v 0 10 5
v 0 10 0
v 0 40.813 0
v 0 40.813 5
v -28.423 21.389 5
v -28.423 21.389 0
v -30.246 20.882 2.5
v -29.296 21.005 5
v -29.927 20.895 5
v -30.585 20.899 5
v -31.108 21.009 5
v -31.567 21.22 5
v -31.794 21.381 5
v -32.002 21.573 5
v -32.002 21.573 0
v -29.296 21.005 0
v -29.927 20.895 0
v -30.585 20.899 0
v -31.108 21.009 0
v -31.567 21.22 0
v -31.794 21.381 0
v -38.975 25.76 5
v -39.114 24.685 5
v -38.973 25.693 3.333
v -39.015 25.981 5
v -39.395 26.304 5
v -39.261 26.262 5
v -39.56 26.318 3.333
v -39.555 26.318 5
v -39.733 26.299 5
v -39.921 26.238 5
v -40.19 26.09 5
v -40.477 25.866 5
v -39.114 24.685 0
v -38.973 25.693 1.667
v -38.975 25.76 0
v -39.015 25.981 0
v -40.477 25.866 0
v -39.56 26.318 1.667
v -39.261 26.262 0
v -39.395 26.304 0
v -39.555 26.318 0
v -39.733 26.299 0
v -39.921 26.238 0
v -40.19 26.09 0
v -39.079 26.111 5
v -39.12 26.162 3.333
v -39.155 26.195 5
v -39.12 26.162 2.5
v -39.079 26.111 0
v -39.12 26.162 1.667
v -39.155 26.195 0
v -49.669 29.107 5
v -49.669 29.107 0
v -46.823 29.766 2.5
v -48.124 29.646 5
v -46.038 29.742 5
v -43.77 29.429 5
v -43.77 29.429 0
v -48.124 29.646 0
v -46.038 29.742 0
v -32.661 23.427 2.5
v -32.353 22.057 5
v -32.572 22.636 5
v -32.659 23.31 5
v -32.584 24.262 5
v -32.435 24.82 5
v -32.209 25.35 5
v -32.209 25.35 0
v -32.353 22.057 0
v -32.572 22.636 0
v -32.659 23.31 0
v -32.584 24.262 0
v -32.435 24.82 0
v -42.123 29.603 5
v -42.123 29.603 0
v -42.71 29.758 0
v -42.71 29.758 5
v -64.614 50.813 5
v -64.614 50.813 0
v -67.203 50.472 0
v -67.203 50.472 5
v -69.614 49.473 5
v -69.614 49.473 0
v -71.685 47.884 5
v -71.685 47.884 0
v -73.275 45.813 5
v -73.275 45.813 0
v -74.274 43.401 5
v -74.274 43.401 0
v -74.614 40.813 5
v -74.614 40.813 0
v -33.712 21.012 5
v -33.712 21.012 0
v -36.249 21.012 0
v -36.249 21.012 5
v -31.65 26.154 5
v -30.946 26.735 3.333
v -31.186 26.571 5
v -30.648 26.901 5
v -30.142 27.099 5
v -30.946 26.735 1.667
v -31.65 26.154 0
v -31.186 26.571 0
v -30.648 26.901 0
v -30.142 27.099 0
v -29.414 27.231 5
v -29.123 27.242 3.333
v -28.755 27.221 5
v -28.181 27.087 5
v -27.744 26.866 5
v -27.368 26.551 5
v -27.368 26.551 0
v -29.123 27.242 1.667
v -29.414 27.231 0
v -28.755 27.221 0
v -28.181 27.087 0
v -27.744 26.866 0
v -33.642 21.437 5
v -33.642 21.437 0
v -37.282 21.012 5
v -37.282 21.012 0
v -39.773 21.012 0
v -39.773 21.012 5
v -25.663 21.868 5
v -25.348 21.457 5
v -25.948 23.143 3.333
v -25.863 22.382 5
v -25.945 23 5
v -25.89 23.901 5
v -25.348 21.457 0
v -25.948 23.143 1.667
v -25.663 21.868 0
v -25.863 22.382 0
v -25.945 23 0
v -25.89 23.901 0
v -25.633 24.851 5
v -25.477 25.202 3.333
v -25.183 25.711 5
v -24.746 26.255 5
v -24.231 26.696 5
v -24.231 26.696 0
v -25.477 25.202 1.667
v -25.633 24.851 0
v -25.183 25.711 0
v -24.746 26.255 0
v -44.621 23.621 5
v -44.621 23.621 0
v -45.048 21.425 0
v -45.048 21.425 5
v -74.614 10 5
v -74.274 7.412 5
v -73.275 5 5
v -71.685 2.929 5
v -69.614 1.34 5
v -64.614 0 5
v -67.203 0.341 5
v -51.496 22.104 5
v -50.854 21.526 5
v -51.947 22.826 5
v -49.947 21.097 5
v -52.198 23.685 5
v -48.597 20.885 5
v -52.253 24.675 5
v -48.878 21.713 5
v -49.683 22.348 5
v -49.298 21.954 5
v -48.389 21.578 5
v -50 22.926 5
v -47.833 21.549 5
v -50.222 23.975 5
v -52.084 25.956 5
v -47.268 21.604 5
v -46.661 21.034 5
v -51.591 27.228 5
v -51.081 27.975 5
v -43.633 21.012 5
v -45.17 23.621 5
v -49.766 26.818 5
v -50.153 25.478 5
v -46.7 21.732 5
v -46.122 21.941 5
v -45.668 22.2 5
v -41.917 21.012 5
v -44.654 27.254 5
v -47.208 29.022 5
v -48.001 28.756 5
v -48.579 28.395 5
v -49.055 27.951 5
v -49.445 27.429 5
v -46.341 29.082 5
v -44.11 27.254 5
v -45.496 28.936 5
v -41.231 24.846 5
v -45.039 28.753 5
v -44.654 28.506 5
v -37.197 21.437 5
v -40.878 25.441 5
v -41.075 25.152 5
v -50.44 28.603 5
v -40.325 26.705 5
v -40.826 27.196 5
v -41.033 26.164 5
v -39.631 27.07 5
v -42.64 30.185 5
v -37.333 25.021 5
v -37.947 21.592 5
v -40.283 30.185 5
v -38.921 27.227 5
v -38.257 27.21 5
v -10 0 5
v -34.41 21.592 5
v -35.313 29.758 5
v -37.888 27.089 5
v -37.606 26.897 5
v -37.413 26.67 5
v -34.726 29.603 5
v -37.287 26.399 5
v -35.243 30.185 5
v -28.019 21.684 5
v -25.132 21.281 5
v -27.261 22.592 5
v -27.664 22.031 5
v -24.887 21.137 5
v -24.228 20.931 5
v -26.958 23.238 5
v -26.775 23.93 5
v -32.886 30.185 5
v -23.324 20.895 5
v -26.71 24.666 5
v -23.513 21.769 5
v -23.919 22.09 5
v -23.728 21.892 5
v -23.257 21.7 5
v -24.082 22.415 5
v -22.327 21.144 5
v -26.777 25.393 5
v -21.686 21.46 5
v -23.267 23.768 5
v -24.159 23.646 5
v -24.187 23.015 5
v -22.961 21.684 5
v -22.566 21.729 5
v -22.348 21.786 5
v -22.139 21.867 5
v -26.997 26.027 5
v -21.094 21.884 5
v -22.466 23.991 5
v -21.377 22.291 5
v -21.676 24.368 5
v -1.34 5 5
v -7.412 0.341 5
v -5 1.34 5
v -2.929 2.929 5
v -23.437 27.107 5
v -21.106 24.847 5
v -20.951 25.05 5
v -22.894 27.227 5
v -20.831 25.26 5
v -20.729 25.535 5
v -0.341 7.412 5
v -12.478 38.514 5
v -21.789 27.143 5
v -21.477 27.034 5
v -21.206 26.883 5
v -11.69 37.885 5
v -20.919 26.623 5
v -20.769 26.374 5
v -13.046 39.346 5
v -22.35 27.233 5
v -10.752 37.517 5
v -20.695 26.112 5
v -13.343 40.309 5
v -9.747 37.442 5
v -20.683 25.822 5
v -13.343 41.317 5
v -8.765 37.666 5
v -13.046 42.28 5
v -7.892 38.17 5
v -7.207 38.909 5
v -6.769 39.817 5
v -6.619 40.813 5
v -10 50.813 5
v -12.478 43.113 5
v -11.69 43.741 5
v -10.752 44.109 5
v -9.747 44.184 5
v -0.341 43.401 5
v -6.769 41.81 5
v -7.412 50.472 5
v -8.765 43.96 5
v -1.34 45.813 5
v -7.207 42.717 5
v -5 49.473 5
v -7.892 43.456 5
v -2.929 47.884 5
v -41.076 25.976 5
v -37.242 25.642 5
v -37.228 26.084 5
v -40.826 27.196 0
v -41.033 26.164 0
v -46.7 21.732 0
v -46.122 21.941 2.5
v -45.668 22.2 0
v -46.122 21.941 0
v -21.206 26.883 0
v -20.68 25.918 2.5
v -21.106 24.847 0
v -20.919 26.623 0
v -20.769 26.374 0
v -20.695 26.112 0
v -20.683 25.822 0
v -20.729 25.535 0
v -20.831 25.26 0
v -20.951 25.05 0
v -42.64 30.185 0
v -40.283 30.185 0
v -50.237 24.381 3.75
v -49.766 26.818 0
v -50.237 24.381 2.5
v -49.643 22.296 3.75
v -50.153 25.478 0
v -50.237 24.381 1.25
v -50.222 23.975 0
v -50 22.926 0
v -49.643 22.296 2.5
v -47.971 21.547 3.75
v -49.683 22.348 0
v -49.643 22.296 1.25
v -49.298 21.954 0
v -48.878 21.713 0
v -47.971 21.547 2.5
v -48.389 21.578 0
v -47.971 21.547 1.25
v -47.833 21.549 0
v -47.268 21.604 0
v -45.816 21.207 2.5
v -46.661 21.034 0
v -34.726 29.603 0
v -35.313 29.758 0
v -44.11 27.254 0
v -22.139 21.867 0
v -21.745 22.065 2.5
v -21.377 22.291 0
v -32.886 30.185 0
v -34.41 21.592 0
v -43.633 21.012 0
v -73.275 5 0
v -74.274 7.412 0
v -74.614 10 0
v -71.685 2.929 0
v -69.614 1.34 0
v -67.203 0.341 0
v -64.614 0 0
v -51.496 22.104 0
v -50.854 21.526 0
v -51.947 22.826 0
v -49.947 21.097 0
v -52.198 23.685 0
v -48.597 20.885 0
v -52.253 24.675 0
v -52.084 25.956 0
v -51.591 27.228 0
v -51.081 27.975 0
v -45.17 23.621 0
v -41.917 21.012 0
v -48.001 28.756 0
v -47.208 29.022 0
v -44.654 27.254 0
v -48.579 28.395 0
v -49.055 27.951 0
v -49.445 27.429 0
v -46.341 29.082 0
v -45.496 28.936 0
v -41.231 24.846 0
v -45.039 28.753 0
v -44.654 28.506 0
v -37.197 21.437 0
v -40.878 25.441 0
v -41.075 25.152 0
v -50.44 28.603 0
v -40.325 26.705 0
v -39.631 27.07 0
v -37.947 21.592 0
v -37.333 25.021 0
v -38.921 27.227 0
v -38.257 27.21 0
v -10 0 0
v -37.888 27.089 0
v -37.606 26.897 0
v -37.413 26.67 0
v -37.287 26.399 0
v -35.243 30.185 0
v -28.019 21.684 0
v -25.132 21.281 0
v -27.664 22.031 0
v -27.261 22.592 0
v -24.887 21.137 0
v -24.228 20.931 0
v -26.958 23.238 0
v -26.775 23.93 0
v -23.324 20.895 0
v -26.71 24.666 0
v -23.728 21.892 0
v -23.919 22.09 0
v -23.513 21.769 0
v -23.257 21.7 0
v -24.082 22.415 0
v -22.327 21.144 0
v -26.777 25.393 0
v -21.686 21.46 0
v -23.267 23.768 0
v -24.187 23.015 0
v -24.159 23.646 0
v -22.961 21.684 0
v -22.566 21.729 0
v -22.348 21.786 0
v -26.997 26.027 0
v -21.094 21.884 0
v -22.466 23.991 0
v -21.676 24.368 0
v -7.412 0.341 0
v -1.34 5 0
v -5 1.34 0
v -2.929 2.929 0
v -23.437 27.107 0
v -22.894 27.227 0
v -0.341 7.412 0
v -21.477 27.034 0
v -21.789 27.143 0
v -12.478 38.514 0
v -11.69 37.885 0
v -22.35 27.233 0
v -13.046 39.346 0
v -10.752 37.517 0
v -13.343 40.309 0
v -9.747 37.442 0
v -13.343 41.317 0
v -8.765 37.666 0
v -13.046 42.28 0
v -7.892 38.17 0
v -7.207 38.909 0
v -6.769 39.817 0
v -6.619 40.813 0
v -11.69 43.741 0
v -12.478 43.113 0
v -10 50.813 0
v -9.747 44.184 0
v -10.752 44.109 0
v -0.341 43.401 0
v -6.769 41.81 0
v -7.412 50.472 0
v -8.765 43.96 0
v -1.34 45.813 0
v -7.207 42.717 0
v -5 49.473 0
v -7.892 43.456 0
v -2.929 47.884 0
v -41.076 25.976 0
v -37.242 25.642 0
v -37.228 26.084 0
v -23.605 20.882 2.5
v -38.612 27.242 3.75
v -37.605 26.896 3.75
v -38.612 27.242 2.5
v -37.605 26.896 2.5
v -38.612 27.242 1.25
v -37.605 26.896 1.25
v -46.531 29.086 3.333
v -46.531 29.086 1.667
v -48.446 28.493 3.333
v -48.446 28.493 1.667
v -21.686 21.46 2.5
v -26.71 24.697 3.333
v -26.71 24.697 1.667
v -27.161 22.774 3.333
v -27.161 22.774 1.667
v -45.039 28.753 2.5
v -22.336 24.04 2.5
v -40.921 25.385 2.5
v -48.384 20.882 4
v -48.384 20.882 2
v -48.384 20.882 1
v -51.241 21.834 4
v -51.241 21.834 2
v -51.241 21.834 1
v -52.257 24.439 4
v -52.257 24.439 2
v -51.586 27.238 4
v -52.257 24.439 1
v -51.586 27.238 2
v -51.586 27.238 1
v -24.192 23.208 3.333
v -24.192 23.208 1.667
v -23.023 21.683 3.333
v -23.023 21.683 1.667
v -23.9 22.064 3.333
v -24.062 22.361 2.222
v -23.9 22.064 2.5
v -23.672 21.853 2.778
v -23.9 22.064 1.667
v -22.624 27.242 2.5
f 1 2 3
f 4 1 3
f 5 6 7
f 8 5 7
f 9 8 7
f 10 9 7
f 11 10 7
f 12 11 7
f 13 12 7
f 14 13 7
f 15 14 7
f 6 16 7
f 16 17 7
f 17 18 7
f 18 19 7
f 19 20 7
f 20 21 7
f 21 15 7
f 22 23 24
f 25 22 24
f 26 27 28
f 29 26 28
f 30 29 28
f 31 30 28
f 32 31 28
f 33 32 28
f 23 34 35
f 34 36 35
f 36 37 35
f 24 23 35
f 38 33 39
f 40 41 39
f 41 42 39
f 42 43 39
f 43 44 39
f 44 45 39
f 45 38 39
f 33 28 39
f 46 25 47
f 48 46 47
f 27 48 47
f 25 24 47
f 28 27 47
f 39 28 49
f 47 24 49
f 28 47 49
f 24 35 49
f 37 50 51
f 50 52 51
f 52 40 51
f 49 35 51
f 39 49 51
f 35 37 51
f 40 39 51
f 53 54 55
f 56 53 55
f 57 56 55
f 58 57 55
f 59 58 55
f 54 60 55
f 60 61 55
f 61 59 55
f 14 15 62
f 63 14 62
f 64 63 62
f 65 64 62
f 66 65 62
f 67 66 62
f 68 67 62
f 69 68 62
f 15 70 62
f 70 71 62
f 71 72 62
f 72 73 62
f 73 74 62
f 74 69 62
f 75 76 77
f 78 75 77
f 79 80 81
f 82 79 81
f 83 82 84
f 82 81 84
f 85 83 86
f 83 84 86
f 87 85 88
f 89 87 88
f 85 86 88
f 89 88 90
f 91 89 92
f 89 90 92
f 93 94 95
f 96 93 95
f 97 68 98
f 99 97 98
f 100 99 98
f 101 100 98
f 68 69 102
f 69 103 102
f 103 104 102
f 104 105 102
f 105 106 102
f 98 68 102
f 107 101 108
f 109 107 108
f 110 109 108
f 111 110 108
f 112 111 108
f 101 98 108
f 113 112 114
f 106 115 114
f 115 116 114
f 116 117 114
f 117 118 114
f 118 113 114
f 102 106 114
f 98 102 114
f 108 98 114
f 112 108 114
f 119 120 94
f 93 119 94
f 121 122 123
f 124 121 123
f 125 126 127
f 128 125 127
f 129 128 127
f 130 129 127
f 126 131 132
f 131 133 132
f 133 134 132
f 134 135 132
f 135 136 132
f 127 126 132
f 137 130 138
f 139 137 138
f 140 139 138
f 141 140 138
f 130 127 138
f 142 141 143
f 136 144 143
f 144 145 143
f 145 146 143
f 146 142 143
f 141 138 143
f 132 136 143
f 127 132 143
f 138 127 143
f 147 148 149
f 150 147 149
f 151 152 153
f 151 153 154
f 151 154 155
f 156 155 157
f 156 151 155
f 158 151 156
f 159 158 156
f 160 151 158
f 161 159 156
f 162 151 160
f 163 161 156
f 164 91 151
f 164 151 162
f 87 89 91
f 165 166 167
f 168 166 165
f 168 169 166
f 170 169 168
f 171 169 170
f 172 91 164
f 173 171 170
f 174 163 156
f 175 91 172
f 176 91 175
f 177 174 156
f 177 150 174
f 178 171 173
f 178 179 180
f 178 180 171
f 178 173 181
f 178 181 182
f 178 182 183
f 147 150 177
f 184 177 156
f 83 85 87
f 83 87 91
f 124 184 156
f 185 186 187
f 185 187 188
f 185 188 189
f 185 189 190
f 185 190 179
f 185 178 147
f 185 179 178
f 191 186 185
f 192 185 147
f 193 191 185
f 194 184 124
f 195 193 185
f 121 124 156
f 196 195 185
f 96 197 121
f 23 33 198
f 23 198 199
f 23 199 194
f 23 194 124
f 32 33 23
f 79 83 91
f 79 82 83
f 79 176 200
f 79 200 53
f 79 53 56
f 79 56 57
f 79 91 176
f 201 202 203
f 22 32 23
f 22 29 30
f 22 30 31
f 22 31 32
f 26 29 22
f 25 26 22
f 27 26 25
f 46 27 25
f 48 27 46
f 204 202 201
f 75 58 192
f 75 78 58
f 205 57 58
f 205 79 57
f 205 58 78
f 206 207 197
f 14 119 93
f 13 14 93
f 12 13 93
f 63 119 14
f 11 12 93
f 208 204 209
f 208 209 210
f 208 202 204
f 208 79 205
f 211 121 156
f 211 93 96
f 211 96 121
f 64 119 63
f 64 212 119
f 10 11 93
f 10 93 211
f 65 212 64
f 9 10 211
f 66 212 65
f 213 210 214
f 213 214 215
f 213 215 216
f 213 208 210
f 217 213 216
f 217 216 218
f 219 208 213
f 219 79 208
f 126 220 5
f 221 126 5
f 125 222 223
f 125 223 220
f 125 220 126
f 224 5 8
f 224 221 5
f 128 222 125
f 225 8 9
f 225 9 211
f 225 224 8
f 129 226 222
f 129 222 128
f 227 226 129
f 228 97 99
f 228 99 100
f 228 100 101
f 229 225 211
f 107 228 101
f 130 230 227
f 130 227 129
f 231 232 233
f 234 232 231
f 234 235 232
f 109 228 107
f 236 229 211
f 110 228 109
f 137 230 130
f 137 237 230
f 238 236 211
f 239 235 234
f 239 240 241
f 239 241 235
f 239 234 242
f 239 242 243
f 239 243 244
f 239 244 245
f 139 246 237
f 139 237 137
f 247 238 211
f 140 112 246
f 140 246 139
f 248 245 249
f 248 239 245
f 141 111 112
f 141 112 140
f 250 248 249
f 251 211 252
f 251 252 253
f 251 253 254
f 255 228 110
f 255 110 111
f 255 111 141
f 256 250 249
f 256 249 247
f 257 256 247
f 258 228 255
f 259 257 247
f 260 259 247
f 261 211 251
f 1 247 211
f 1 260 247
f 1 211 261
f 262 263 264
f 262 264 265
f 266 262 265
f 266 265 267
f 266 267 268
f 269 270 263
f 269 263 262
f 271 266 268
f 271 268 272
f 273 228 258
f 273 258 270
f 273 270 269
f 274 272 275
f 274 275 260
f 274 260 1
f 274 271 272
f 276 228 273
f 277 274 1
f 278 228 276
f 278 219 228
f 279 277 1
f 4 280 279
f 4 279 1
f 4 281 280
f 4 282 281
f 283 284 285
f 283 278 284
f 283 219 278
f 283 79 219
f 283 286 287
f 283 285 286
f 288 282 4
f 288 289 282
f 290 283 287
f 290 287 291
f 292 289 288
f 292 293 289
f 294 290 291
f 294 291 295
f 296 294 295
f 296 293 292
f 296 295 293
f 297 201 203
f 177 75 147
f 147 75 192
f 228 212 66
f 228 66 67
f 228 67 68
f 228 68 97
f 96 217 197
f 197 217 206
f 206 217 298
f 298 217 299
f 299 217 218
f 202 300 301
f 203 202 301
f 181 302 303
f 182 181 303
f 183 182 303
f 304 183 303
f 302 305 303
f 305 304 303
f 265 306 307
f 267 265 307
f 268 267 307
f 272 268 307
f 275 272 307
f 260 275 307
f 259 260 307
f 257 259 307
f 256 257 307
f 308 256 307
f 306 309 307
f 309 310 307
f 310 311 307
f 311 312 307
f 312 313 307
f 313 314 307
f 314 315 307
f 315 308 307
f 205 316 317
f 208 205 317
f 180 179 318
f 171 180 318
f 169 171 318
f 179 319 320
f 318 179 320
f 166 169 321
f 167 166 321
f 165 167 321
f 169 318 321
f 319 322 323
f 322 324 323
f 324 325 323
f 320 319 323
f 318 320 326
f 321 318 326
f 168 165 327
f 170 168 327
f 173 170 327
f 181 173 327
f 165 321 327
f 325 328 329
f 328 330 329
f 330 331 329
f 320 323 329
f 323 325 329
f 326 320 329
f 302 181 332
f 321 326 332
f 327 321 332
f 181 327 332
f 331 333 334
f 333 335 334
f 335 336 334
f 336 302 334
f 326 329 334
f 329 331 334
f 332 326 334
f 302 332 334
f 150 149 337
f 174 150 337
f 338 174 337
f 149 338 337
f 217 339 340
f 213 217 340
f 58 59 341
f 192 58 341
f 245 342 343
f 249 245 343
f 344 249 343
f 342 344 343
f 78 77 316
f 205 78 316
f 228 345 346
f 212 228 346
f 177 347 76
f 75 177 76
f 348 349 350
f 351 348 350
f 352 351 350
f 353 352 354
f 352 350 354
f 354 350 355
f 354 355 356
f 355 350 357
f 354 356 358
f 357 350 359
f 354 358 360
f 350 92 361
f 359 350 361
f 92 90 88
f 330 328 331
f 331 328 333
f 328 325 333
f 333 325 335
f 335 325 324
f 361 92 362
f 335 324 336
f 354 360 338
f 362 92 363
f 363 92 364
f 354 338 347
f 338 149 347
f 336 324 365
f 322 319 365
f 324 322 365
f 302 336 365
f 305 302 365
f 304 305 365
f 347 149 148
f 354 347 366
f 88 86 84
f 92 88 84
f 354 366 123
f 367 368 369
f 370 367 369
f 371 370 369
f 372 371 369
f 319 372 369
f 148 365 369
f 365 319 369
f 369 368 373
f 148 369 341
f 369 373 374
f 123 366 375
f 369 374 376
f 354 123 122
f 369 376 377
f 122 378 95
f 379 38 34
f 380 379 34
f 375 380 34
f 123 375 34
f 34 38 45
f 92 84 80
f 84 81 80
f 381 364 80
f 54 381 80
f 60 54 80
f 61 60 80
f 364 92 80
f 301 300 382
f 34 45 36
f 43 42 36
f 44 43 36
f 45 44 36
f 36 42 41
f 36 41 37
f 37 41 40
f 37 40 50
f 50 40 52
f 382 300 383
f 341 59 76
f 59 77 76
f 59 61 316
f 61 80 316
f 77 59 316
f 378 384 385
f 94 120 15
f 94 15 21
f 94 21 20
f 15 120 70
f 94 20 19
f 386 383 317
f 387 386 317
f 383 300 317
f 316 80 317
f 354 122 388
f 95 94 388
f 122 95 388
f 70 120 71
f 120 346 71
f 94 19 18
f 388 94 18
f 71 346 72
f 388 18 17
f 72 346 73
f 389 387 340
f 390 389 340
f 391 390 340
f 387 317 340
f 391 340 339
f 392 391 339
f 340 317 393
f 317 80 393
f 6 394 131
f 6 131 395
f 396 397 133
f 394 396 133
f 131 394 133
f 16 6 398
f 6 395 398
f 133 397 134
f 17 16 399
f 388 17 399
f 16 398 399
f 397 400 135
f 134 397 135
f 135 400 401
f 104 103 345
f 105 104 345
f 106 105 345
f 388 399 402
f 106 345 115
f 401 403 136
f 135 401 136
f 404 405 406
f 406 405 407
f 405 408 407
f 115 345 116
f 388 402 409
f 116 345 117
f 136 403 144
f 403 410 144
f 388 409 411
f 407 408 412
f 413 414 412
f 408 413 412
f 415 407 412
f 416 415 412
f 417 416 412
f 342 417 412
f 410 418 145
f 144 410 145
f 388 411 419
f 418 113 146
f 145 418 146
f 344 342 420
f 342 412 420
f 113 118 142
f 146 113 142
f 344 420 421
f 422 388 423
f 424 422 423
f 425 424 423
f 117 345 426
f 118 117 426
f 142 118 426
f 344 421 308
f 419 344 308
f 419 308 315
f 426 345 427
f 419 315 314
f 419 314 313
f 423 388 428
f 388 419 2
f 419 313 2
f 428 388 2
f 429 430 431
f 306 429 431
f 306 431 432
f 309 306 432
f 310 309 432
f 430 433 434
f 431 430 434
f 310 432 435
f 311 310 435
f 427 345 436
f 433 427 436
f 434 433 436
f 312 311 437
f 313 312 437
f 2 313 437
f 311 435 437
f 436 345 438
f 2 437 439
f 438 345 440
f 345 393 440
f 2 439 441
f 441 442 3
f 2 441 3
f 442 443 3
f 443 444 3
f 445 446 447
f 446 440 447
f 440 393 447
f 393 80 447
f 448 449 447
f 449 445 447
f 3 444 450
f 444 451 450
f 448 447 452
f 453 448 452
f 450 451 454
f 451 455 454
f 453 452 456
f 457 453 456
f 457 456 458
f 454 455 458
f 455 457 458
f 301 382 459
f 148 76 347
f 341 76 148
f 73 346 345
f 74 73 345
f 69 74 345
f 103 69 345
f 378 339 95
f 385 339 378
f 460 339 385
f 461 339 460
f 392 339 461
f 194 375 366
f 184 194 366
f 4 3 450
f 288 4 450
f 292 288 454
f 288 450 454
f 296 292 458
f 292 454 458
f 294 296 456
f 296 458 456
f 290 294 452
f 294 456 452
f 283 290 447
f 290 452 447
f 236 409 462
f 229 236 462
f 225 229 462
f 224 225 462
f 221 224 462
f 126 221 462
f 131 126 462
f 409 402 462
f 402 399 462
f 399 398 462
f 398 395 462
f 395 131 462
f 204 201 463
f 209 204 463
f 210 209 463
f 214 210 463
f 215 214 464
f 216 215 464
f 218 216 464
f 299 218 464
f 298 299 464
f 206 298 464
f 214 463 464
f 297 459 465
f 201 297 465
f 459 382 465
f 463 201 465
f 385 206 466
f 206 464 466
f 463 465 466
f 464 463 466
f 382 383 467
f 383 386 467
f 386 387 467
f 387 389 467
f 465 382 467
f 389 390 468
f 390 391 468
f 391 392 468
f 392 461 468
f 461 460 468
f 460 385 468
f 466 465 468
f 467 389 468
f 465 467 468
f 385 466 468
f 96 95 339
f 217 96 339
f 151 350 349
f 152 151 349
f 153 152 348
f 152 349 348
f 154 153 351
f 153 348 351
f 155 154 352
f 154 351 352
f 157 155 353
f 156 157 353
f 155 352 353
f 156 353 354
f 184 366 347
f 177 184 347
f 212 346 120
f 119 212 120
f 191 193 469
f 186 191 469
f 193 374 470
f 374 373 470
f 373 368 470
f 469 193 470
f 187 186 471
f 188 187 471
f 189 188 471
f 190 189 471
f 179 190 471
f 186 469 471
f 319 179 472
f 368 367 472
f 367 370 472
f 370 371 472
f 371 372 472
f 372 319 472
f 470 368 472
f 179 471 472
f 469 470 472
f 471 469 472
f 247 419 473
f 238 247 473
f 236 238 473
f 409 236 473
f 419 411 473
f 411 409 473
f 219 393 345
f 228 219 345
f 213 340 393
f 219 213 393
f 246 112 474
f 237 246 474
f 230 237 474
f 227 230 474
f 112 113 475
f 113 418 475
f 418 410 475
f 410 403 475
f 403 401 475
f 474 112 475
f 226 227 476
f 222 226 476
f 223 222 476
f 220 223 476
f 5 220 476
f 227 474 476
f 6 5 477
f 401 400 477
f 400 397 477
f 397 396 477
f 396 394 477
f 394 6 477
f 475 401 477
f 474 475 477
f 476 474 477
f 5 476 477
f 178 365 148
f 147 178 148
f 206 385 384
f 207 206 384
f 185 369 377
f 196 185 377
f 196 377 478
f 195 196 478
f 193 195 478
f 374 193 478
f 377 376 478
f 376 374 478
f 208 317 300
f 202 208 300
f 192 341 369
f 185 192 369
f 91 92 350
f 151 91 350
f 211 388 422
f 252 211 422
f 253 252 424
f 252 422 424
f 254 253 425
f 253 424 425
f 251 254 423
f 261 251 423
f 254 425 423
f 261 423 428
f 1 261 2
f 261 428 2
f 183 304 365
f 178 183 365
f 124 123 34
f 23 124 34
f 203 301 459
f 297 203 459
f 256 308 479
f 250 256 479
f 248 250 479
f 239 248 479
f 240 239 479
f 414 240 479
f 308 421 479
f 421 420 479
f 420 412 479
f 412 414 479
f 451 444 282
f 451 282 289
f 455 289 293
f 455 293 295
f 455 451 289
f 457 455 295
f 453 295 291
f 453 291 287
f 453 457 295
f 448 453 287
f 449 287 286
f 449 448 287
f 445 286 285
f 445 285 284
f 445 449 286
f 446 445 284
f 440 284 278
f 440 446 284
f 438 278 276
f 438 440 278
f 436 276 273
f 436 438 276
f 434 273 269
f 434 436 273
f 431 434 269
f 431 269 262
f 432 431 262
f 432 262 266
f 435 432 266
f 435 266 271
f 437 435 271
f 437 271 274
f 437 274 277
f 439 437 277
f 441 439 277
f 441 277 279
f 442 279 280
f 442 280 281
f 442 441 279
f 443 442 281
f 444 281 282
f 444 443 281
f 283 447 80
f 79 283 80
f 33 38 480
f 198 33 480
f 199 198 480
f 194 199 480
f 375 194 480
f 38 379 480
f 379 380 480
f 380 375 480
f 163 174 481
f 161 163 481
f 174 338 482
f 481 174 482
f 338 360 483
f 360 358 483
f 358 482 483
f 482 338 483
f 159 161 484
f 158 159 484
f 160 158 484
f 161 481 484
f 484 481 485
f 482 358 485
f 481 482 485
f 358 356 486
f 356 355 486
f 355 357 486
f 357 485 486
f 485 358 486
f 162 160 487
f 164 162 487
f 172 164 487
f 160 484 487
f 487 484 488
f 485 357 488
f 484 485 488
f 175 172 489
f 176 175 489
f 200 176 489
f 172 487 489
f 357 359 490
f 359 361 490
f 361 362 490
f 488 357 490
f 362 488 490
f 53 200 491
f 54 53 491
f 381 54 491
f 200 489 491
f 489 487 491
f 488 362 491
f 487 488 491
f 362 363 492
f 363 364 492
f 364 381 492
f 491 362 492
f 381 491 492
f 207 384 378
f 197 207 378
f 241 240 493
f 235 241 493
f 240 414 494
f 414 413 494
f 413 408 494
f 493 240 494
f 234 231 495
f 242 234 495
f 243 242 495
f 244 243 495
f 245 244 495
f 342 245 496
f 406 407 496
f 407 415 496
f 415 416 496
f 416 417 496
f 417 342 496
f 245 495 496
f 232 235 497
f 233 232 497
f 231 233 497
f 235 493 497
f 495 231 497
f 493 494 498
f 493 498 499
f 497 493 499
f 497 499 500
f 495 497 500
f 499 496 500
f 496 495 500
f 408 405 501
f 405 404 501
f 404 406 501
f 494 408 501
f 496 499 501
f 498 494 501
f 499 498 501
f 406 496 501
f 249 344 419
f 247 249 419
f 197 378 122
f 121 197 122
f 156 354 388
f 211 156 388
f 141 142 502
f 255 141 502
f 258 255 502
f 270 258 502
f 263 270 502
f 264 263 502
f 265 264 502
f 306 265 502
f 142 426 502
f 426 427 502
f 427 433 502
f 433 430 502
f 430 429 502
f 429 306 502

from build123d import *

# Parameters (mm, degrees)
F0_R     = 3.3807298635
F1_DEPTH = 5


with BuildPart() as f1:
    # F0 (on Top) → F1 (new body)
    with BuildSketch(Plane.XY):
        with BuildLine():
            Line((-64.6143609347, 0), (-10, 0))
            ThreePointArc((-10, 0), (-2.9289321881, 2.9289321881), (0, 10))
            Line((0, 10), (0, 40.8130657572))
            ThreePointArc((0, 40.8130657572), (-2.9289321881, 47.8841335691), (-10, 50.8130657572))
            Line((-10, 50.8130657572), (-64.6143609347, 50.8130657572))
            ThreePointArc((-64.6143609347, 50.8130657572), (-71.6854287466, 47.8841335691), (-74.6143609347, 40.8130657572))
            Line((-74.6143609347, 40.8130657572), (-74.6143609347, 10))
            ThreePointArc((-74.6143609347, 10), (-71.6854287466, 2.9289321881), (-64.6143609347, 0))
        make_face()
        with BuildLine():
            add(Edge.make_bspline(
                [(-46.661470066, 21.0336615097), (-47.5455431911, 20.8818405408), (-48.3841733051, 20.8818405408)],
                knots=[0, 0, 0, 1, 1, 1], degree=2))
            add(Edge.make_bspline(
                [(-48.3841733051, 20.8818405408), (-50.2246152549, 20.8818405408), (-51.2408862305, 21.8340781826)],
                knots=[0, 0, 0, 1, 1, 1], degree=2))
            add(Edge.make_bspline(
                [(-51.2408862305, 21.8340781826), (-52.2571572061, 22.7863158244), (-52.2571572061, 24.4387889555)],
                knots=[0, 0, 0, 1, 1, 1], degree=2))
            add(Edge.make_bspline(
                [(-52.2571572061, 24.4387889555), (-52.2571572061, 26.0272287528), (-51.5858399966, 27.2376653213)],
                knots=[0, 0, 0, 1, 1, 1], degree=2))
            add(Edge.make_bspline(
                [(-51.5858399966, 27.2376653213), (-50.9145227871, 28.4481018898), (-49.6689711646, 29.1070255508)],
                knots=[0, 0, 0, 1, 1, 1], degree=2))
            add(Edge.make_bspline(
                [(-49.6689711646, 29.1070255508), (-48.423419542, 29.7659492119), (-46.8225861963, 29.7659492119)],
                knots=[0, 0, 0, 1, 1, 1], degree=2))
            add(Edge.make_bspline(
                [(-46.8225861963, 29.7659492119), (-45.3642786581, 29.7659492119), (-43.7696420866, 29.4292578114)],
                knots=[0, 0, 0, 1, 1, 1], degree=2))
            Line((-43.7696420866, 29.4292578114), (-44.1104646699, 27.2541900526))
            Line((-44.1104646699, 27.2541900526), (-44.6537152117, 27.2541900526))
            Line((-44.6537152117, 27.2541900526), (-44.6537152117, 28.5059384494))
            add(Edge.make_bspline(
                [(-44.6537152117, 28.5059384494), (-45.0028001606, 28.7847932903), (-45.4964765086, 28.9355814635)],
                knots=[0, 0, 0, 1, 1, 1], degree=2))
            add(Edge.make_bspline(
                [(-45.4964765086, 28.9355814635), (-45.9901528565, 29.0863696367), (-46.5313378069, 29.0863696367)],
                knots=[0, 0, 0, 1, 1, 1], degree=2))
            add(Edge.make_bspline(
                [(-46.5313378069, 29.0863696367), (-47.5971829765, 29.0863696367), (-48.4461410476, 28.4925121052)],
                knots=[0, 0, 0, 1, 1, 1], degree=2))
            add(Edge.make_bspline(
                [(-48.4461410476, 28.4925121052), (-49.2950991187, 27.8986545737), (-49.766053961, 26.8183502643)],
                knots=[0, 0, 0, 1, 1, 1], degree=2))
            add(Edge.make_bspline(
                [(-49.766053961, 26.8183502643), (-50.2370088034, 25.7380459548), (-50.2370088034, 24.3809523959)],
                knots=[0, 0, 0, 1, 1, 1], degree=2))
            add(Edge.make_bspline(
                [(-50.2370088034, 24.3809523959), (-50.2370088034, 23.0445147511), (-49.6431512719, 22.2957378636)],
                knots=[0, 0, 0, 1, 1, 1], degree=2))
            add(Edge.make_bspline(
                [(-49.6431512719, 22.2957378636), (-49.0492937404, 21.5469609761), (-47.9710550224, 21.5469609761)],
                knots=[0, 0, 0, 1, 1, 1], degree=2))
            add(Edge.make_bspline(
                [(-47.9710550224, 21.5469609761), (-47.3389840497, 21.5469609761), (-46.6996835071, 21.7318314076)],
                knots=[0, 0, 0, 1, 1, 1], degree=2))
            add(Edge.make_bspline(
                [(-46.6996835071, 21.7318314076), (-46.0603829645, 21.9167018392), (-45.6679205959, 22.1996878629)],
                knots=[0, 0, 0, 1, 1, 1], degree=2))
            Line((-45.6679205959, 22.1996878629), (-45.1701130652, 23.6208147556))
            Line((-45.1701130652, 23.6208147556), (-44.6206657491, 23.6208147556))
            Line((-44.6206657491, 23.6208147556), (-45.0482431718, 21.4250910827))
            add(Edge.make_bspline(
                [(-45.0482431718, 21.4250910827), (-45.7773969408, 21.1854824787), (-46.661470066, 21.0336615097)],
                knots=[0, 0, 0, 1, 1, 1], degree=2))
        make_face(mode=Mode.SUBTRACT)
        with BuildLine():
            add(Edge.make_bspline(
                [(-28.4233306773, 21.3889432329), (-29.2340753072, 20.8818405408), (-30.2462151, 20.8818405408)],
                knots=[0, 0, 0, 1, 1, 1], degree=2))
            add(Edge.make_bspline(
                [(-30.2462151, 20.8818405408), (-31.3430441408, 20.8818405408), (-32.0019678018, 21.5727808688)],
                knots=[0, 0, 0, 1, 1, 1], degree=2))
            add(Edge.make_bspline(
                [(-32.0019678018, 21.5727808688), (-32.6608914628, 22.2637211967), (-32.6608914628, 23.4266491627)],
                knots=[0, 0, 0, 1, 1, 1], degree=2))
            add(Edge.make_bspline(
                [(-32.6608914628, 23.4266491627), (-32.6608914628, 24.4718384181), (-32.2085269432, 25.349714769)],
                knots=[0, 0, 0, 1, 1, 1], degree=2))
            add(Edge.make_bspline(
                [(-32.2085269432, 25.349714769), (-31.7561624235, 26.2275911199), (-30.9464505893, 26.734693812)],
                knots=[0, 0, 0, 1, 1, 1], degree=2))
            add(Edge.make_bspline(
                [(-30.9464505893, 26.734693812), (-30.1367387551, 27.2417965041), (-29.1225333709, 27.2417965041)],
                knots=[0, 0, 0, 1, 1, 1], degree=2))
            add(Edge.make_bspline(
                [(-29.1225333709, 27.2417965041), (-28.0257043301, 27.2417965041), (-27.3678134648, 26.5508561762)],
                knots=[0, 0, 0, 1, 1, 1], degree=2))
            add(Edge.make_bspline(
                [(-27.3678134648, 26.5508561762), (-26.7099225995, 25.8599158482), (-26.7099225995, 24.6969878822)],
                knots=[0, 0, 0, 1, 1, 1], degree=2))
            add(Edge.make_bspline(
                [(-26.7099225995, 24.6969878822), (-26.7099225995, 23.6517986268), (-27.1612543234, 22.7739222759)],
                knots=[0, 0, 0, 1, 1, 1], degree=2))
            add(Edge.make_bspline(
                [(-27.1612543234, 22.7739222759), (-27.6125860473, 21.896045925), (-28.4233306773, 21.3889432329)],
                knots=[0, 0, 0, 1, 1, 1], degree=2))
        make_face(mode=Mode.SUBTRACT)
        with BuildLine():
            add(Edge.make_bspline(
                [(-21.2061542772, 26.8834163938), (-20.6804612624, 26.5250362835), (-20.6804612624, 25.9177524078)],
                knots=[0, 0, 0, 1, 1, 1], degree=2))
            add(Edge.make_bspline(
                [(-20.6804612624, 25.9177524078), (-20.6804612624, 25.3373212205), (-21.1059730937, 24.8467432597)],
                knots=[0, 0, 0, 1, 1, 1], degree=2))
            add(Edge.make_bspline(
                [(-21.1059730937, 24.8467432597), (-21.5314849249, 24.3561652989), (-22.3360327806, 24.0401298126)],
                knots=[0, 0, 0, 1, 1, 1], degree=2))
            add(Edge.make_bspline(
                [(-22.3360327806, 24.0401298126), (-23.1405806363, 23.7240943263), (-24.1589172033, 23.6456018526)],
                knots=[0, 0, 0, 1, 1, 1], degree=2))
            add(Edge.make_bspline(
                [(-24.1589172033, 23.6456018526), (-24.191966666, 23.5175351849), (-24.191966666, 23.2076964728)],
                knots=[0, 0, 0, 1, 1, 1], degree=2))
            add(Edge.make_bspline(
                [(-24.191966666, 23.2076964728), (-24.191966666, 21.6832900094), (-23.0228419257, 21.6832900094)],
                knots=[0, 0, 0, 1, 1, 1], degree=2))
            add(Edge.make_bspline(
                [(-23.0228419257, 21.6832900094), (-22.5456903091, 21.6832900094), (-22.1387688006, 21.8671276452)],
                knots=[0, 0, 0, 1, 1, 1], degree=2))
            add(Edge.make_bspline(
                [(-22.1387688006, 21.8671276452), (-21.7318472921, 22.0509652811), (-21.3765655689, 22.2905738851)],
                knots=[0, 0, 0, 1, 1, 1], degree=2))
            Line((-21.3765655689, 22.2905738851), (-21.0935795452, 21.8836523765))
            add(Edge.make_bspline(
                [(-21.0935795452, 21.8836523765), (-21.661617184, 21.4065007599), (-22.3267376192, 21.1441706504)],
                knots=[0, 0, 0, 1, 1, 1], degree=2))
            add(Edge.make_bspline(
                [(-22.3267376192, 21.1441706504), (-22.9918580545, 20.8818405408), (-23.6053387044, 20.8818405408)],
                knots=[0, 0, 0, 1, 1, 1], degree=2))
            add(Edge.make_bspline(
                [(-23.6053387044, 20.8818405408), (-24.7476107563, 20.8818405408), (-25.347665062, 21.4571077496)],
                knots=[0, 0, 0, 1, 1, 1], degree=2))
            add(Edge.make_bspline(
                [(-25.347665062, 21.4571077496), (-25.9477193678, 22.0323749583), (-25.9477193678, 23.1426303433)],
                knots=[0, 0, 0, 1, 1, 1], degree=2))
            add(Edge.make_bspline(
                [(-25.9477193678, 23.1426303433), (-25.9477193678, 24.2528857282), (-25.4767645254, 25.2020249829)],
                knots=[0, 0, 0, 1, 1, 1], degree=2))
            add(Edge.make_bspline(
                [(-25.4767645254, 25.2020249829), (-25.005809683, 26.1511642376), (-24.2312129028, 26.6964803709)],
                knots=[0, 0, 0, 1, 1, 1], degree=2))
            add(Edge.make_bspline(
                [(-24.2312129028, 26.6964803709), (-23.4566161226, 27.2417965041), (-22.6241827828, 27.2417965041)],
                knots=[0, 0, 0, 1, 1, 1], degree=2))
            add(Edge.make_bspline(
                [(-22.6241827828, 27.2417965041), (-21.7318472921, 27.2417965041), (-21.2061542772, 26.8834163938)],
                knots=[0, 0, 0, 1, 1, 1], degree=2))
        make_face(mode=Mode.SUBTRACT)
        with BuildLine():
            Line((-41.0327334632, 26.1635577861), (-41.0761108829, 25.9755889674))
            add(Edge.make_bspline(
                [(-41.0761108829, 25.9755889674), (-40.0825614128, 27.2417965041), (-38.6118603262, 27.2417965041)],
                knots=[0, 0, 0, 1, 1, 1], degree=2))
            add(Edge.make_bspline(
                [(-38.6118603262, 27.2417965041), (-37.9859861278, 27.2417965041), (-37.6048845119, 26.8958099423)],
                knots=[0, 0, 0, 1, 1, 1], degree=2))
            add(Edge.make_bspline(
                [(-37.6048845119, 26.8958099423), (-37.223782896, 26.5498233805), (-37.223782896, 25.9569986447)],
                knots=[0, 0, 0, 1, 1, 1], degree=2))
            add(Edge.make_bspline(
                [(-37.223782896, 25.9569986447), (-37.223782896, 25.6203072442), (-37.333259241, 25.0212857342)],
                knots=[0, 0, 0, 1, 1, 1], degree=2))
            Line((-37.333259241, 25.0212857342), (-37.9467398909, 21.5924039872))
            Line((-37.9467398909, 21.5924039872), (-37.1969302077, 21.4374846312))
            Line((-37.1969302077, 21.4374846312), (-37.2816194556, 21.0119727999))
            Line((-37.2816194556, 21.0119727999), (-39.7727227007, 21.0119727999))
            Line((-39.7727227007, 21.0119727999), (-39.1137990397, 24.6845943337))
            add(Edge.make_bspline(
                [(-39.1137990397, 24.6845943337), (-38.9733388236, 25.434404017), (-38.9733388236, 25.6926029437)],
                knots=[0, 0, 0, 1, 1, 1], degree=2))
            add(Edge.make_bspline(
                [(-38.9733388236, 25.6926029437), (-38.9733388236, 26.3184771421), (-39.5599667851, 26.3184771421)],
                knots=[0, 0, 0, 1, 1, 1], degree=2))
            add(Edge.make_bspline(
                [(-39.5599667851, 26.3184771421), (-39.9668882936, 26.3184771421), (-40.4770893729, 25.8661126225)],
                knots=[0, 0, 0, 1, 1, 1], degree=2))
            add(Edge.make_bspline(
                [(-40.4770893729, 25.8661126225), (-40.9872904521, 25.4137481028), (-41.2310302389, 24.845710464)],
                knots=[0, 0, 0, 1, 1, 1], degree=2))
            Line((-41.2310302389, 24.845710464), (-41.9168065883, 21.0119727999))
            Line((-41.9168065883, 21.0119727999), (-43.6333130533, 21.0119727999))
            Line((-43.6333130533, 21.0119727999), (-42.1233657297, 29.6027674902))
            Line((-42.1233657297, 29.6027674902), (-42.7099936913, 29.7576868462))
            Line((-42.7099936913, 29.7576868462), (-42.6397635832, 30.1852642689))
            Line((-42.6397635832, 30.1852642689), (-40.28292378, 30.1852642689))
            Line((-40.28292378, 30.1852642689), (-40.8261743218, 27.196353493))
            Line((-40.8261743218, 27.196353493), (-41.0327334632, 26.1635577861))
        make_face(mode=Mode.SUBTRACT)
        Polygon((-32.8860409269, 30.1852642689), (-34.4104473904, 21.5924039872), (-33.6420473844, 21.4374846312), (-33.7122774925, 21.0119727999), (-36.2488237487, 21.0119727999), (-34.7264828767, 29.6027674902), (-35.3131108382, 29.7576868462), (-35.2428807301, 30.1852642689), align=None, mode=Mode.SUBTRACT)
        with Locations((-10, 40.8130657572)):
            Circle(F0_R, mode=Mode.SUBTRACT)
    extrude(amount=F1_DEPTH)


solid = f1.part
